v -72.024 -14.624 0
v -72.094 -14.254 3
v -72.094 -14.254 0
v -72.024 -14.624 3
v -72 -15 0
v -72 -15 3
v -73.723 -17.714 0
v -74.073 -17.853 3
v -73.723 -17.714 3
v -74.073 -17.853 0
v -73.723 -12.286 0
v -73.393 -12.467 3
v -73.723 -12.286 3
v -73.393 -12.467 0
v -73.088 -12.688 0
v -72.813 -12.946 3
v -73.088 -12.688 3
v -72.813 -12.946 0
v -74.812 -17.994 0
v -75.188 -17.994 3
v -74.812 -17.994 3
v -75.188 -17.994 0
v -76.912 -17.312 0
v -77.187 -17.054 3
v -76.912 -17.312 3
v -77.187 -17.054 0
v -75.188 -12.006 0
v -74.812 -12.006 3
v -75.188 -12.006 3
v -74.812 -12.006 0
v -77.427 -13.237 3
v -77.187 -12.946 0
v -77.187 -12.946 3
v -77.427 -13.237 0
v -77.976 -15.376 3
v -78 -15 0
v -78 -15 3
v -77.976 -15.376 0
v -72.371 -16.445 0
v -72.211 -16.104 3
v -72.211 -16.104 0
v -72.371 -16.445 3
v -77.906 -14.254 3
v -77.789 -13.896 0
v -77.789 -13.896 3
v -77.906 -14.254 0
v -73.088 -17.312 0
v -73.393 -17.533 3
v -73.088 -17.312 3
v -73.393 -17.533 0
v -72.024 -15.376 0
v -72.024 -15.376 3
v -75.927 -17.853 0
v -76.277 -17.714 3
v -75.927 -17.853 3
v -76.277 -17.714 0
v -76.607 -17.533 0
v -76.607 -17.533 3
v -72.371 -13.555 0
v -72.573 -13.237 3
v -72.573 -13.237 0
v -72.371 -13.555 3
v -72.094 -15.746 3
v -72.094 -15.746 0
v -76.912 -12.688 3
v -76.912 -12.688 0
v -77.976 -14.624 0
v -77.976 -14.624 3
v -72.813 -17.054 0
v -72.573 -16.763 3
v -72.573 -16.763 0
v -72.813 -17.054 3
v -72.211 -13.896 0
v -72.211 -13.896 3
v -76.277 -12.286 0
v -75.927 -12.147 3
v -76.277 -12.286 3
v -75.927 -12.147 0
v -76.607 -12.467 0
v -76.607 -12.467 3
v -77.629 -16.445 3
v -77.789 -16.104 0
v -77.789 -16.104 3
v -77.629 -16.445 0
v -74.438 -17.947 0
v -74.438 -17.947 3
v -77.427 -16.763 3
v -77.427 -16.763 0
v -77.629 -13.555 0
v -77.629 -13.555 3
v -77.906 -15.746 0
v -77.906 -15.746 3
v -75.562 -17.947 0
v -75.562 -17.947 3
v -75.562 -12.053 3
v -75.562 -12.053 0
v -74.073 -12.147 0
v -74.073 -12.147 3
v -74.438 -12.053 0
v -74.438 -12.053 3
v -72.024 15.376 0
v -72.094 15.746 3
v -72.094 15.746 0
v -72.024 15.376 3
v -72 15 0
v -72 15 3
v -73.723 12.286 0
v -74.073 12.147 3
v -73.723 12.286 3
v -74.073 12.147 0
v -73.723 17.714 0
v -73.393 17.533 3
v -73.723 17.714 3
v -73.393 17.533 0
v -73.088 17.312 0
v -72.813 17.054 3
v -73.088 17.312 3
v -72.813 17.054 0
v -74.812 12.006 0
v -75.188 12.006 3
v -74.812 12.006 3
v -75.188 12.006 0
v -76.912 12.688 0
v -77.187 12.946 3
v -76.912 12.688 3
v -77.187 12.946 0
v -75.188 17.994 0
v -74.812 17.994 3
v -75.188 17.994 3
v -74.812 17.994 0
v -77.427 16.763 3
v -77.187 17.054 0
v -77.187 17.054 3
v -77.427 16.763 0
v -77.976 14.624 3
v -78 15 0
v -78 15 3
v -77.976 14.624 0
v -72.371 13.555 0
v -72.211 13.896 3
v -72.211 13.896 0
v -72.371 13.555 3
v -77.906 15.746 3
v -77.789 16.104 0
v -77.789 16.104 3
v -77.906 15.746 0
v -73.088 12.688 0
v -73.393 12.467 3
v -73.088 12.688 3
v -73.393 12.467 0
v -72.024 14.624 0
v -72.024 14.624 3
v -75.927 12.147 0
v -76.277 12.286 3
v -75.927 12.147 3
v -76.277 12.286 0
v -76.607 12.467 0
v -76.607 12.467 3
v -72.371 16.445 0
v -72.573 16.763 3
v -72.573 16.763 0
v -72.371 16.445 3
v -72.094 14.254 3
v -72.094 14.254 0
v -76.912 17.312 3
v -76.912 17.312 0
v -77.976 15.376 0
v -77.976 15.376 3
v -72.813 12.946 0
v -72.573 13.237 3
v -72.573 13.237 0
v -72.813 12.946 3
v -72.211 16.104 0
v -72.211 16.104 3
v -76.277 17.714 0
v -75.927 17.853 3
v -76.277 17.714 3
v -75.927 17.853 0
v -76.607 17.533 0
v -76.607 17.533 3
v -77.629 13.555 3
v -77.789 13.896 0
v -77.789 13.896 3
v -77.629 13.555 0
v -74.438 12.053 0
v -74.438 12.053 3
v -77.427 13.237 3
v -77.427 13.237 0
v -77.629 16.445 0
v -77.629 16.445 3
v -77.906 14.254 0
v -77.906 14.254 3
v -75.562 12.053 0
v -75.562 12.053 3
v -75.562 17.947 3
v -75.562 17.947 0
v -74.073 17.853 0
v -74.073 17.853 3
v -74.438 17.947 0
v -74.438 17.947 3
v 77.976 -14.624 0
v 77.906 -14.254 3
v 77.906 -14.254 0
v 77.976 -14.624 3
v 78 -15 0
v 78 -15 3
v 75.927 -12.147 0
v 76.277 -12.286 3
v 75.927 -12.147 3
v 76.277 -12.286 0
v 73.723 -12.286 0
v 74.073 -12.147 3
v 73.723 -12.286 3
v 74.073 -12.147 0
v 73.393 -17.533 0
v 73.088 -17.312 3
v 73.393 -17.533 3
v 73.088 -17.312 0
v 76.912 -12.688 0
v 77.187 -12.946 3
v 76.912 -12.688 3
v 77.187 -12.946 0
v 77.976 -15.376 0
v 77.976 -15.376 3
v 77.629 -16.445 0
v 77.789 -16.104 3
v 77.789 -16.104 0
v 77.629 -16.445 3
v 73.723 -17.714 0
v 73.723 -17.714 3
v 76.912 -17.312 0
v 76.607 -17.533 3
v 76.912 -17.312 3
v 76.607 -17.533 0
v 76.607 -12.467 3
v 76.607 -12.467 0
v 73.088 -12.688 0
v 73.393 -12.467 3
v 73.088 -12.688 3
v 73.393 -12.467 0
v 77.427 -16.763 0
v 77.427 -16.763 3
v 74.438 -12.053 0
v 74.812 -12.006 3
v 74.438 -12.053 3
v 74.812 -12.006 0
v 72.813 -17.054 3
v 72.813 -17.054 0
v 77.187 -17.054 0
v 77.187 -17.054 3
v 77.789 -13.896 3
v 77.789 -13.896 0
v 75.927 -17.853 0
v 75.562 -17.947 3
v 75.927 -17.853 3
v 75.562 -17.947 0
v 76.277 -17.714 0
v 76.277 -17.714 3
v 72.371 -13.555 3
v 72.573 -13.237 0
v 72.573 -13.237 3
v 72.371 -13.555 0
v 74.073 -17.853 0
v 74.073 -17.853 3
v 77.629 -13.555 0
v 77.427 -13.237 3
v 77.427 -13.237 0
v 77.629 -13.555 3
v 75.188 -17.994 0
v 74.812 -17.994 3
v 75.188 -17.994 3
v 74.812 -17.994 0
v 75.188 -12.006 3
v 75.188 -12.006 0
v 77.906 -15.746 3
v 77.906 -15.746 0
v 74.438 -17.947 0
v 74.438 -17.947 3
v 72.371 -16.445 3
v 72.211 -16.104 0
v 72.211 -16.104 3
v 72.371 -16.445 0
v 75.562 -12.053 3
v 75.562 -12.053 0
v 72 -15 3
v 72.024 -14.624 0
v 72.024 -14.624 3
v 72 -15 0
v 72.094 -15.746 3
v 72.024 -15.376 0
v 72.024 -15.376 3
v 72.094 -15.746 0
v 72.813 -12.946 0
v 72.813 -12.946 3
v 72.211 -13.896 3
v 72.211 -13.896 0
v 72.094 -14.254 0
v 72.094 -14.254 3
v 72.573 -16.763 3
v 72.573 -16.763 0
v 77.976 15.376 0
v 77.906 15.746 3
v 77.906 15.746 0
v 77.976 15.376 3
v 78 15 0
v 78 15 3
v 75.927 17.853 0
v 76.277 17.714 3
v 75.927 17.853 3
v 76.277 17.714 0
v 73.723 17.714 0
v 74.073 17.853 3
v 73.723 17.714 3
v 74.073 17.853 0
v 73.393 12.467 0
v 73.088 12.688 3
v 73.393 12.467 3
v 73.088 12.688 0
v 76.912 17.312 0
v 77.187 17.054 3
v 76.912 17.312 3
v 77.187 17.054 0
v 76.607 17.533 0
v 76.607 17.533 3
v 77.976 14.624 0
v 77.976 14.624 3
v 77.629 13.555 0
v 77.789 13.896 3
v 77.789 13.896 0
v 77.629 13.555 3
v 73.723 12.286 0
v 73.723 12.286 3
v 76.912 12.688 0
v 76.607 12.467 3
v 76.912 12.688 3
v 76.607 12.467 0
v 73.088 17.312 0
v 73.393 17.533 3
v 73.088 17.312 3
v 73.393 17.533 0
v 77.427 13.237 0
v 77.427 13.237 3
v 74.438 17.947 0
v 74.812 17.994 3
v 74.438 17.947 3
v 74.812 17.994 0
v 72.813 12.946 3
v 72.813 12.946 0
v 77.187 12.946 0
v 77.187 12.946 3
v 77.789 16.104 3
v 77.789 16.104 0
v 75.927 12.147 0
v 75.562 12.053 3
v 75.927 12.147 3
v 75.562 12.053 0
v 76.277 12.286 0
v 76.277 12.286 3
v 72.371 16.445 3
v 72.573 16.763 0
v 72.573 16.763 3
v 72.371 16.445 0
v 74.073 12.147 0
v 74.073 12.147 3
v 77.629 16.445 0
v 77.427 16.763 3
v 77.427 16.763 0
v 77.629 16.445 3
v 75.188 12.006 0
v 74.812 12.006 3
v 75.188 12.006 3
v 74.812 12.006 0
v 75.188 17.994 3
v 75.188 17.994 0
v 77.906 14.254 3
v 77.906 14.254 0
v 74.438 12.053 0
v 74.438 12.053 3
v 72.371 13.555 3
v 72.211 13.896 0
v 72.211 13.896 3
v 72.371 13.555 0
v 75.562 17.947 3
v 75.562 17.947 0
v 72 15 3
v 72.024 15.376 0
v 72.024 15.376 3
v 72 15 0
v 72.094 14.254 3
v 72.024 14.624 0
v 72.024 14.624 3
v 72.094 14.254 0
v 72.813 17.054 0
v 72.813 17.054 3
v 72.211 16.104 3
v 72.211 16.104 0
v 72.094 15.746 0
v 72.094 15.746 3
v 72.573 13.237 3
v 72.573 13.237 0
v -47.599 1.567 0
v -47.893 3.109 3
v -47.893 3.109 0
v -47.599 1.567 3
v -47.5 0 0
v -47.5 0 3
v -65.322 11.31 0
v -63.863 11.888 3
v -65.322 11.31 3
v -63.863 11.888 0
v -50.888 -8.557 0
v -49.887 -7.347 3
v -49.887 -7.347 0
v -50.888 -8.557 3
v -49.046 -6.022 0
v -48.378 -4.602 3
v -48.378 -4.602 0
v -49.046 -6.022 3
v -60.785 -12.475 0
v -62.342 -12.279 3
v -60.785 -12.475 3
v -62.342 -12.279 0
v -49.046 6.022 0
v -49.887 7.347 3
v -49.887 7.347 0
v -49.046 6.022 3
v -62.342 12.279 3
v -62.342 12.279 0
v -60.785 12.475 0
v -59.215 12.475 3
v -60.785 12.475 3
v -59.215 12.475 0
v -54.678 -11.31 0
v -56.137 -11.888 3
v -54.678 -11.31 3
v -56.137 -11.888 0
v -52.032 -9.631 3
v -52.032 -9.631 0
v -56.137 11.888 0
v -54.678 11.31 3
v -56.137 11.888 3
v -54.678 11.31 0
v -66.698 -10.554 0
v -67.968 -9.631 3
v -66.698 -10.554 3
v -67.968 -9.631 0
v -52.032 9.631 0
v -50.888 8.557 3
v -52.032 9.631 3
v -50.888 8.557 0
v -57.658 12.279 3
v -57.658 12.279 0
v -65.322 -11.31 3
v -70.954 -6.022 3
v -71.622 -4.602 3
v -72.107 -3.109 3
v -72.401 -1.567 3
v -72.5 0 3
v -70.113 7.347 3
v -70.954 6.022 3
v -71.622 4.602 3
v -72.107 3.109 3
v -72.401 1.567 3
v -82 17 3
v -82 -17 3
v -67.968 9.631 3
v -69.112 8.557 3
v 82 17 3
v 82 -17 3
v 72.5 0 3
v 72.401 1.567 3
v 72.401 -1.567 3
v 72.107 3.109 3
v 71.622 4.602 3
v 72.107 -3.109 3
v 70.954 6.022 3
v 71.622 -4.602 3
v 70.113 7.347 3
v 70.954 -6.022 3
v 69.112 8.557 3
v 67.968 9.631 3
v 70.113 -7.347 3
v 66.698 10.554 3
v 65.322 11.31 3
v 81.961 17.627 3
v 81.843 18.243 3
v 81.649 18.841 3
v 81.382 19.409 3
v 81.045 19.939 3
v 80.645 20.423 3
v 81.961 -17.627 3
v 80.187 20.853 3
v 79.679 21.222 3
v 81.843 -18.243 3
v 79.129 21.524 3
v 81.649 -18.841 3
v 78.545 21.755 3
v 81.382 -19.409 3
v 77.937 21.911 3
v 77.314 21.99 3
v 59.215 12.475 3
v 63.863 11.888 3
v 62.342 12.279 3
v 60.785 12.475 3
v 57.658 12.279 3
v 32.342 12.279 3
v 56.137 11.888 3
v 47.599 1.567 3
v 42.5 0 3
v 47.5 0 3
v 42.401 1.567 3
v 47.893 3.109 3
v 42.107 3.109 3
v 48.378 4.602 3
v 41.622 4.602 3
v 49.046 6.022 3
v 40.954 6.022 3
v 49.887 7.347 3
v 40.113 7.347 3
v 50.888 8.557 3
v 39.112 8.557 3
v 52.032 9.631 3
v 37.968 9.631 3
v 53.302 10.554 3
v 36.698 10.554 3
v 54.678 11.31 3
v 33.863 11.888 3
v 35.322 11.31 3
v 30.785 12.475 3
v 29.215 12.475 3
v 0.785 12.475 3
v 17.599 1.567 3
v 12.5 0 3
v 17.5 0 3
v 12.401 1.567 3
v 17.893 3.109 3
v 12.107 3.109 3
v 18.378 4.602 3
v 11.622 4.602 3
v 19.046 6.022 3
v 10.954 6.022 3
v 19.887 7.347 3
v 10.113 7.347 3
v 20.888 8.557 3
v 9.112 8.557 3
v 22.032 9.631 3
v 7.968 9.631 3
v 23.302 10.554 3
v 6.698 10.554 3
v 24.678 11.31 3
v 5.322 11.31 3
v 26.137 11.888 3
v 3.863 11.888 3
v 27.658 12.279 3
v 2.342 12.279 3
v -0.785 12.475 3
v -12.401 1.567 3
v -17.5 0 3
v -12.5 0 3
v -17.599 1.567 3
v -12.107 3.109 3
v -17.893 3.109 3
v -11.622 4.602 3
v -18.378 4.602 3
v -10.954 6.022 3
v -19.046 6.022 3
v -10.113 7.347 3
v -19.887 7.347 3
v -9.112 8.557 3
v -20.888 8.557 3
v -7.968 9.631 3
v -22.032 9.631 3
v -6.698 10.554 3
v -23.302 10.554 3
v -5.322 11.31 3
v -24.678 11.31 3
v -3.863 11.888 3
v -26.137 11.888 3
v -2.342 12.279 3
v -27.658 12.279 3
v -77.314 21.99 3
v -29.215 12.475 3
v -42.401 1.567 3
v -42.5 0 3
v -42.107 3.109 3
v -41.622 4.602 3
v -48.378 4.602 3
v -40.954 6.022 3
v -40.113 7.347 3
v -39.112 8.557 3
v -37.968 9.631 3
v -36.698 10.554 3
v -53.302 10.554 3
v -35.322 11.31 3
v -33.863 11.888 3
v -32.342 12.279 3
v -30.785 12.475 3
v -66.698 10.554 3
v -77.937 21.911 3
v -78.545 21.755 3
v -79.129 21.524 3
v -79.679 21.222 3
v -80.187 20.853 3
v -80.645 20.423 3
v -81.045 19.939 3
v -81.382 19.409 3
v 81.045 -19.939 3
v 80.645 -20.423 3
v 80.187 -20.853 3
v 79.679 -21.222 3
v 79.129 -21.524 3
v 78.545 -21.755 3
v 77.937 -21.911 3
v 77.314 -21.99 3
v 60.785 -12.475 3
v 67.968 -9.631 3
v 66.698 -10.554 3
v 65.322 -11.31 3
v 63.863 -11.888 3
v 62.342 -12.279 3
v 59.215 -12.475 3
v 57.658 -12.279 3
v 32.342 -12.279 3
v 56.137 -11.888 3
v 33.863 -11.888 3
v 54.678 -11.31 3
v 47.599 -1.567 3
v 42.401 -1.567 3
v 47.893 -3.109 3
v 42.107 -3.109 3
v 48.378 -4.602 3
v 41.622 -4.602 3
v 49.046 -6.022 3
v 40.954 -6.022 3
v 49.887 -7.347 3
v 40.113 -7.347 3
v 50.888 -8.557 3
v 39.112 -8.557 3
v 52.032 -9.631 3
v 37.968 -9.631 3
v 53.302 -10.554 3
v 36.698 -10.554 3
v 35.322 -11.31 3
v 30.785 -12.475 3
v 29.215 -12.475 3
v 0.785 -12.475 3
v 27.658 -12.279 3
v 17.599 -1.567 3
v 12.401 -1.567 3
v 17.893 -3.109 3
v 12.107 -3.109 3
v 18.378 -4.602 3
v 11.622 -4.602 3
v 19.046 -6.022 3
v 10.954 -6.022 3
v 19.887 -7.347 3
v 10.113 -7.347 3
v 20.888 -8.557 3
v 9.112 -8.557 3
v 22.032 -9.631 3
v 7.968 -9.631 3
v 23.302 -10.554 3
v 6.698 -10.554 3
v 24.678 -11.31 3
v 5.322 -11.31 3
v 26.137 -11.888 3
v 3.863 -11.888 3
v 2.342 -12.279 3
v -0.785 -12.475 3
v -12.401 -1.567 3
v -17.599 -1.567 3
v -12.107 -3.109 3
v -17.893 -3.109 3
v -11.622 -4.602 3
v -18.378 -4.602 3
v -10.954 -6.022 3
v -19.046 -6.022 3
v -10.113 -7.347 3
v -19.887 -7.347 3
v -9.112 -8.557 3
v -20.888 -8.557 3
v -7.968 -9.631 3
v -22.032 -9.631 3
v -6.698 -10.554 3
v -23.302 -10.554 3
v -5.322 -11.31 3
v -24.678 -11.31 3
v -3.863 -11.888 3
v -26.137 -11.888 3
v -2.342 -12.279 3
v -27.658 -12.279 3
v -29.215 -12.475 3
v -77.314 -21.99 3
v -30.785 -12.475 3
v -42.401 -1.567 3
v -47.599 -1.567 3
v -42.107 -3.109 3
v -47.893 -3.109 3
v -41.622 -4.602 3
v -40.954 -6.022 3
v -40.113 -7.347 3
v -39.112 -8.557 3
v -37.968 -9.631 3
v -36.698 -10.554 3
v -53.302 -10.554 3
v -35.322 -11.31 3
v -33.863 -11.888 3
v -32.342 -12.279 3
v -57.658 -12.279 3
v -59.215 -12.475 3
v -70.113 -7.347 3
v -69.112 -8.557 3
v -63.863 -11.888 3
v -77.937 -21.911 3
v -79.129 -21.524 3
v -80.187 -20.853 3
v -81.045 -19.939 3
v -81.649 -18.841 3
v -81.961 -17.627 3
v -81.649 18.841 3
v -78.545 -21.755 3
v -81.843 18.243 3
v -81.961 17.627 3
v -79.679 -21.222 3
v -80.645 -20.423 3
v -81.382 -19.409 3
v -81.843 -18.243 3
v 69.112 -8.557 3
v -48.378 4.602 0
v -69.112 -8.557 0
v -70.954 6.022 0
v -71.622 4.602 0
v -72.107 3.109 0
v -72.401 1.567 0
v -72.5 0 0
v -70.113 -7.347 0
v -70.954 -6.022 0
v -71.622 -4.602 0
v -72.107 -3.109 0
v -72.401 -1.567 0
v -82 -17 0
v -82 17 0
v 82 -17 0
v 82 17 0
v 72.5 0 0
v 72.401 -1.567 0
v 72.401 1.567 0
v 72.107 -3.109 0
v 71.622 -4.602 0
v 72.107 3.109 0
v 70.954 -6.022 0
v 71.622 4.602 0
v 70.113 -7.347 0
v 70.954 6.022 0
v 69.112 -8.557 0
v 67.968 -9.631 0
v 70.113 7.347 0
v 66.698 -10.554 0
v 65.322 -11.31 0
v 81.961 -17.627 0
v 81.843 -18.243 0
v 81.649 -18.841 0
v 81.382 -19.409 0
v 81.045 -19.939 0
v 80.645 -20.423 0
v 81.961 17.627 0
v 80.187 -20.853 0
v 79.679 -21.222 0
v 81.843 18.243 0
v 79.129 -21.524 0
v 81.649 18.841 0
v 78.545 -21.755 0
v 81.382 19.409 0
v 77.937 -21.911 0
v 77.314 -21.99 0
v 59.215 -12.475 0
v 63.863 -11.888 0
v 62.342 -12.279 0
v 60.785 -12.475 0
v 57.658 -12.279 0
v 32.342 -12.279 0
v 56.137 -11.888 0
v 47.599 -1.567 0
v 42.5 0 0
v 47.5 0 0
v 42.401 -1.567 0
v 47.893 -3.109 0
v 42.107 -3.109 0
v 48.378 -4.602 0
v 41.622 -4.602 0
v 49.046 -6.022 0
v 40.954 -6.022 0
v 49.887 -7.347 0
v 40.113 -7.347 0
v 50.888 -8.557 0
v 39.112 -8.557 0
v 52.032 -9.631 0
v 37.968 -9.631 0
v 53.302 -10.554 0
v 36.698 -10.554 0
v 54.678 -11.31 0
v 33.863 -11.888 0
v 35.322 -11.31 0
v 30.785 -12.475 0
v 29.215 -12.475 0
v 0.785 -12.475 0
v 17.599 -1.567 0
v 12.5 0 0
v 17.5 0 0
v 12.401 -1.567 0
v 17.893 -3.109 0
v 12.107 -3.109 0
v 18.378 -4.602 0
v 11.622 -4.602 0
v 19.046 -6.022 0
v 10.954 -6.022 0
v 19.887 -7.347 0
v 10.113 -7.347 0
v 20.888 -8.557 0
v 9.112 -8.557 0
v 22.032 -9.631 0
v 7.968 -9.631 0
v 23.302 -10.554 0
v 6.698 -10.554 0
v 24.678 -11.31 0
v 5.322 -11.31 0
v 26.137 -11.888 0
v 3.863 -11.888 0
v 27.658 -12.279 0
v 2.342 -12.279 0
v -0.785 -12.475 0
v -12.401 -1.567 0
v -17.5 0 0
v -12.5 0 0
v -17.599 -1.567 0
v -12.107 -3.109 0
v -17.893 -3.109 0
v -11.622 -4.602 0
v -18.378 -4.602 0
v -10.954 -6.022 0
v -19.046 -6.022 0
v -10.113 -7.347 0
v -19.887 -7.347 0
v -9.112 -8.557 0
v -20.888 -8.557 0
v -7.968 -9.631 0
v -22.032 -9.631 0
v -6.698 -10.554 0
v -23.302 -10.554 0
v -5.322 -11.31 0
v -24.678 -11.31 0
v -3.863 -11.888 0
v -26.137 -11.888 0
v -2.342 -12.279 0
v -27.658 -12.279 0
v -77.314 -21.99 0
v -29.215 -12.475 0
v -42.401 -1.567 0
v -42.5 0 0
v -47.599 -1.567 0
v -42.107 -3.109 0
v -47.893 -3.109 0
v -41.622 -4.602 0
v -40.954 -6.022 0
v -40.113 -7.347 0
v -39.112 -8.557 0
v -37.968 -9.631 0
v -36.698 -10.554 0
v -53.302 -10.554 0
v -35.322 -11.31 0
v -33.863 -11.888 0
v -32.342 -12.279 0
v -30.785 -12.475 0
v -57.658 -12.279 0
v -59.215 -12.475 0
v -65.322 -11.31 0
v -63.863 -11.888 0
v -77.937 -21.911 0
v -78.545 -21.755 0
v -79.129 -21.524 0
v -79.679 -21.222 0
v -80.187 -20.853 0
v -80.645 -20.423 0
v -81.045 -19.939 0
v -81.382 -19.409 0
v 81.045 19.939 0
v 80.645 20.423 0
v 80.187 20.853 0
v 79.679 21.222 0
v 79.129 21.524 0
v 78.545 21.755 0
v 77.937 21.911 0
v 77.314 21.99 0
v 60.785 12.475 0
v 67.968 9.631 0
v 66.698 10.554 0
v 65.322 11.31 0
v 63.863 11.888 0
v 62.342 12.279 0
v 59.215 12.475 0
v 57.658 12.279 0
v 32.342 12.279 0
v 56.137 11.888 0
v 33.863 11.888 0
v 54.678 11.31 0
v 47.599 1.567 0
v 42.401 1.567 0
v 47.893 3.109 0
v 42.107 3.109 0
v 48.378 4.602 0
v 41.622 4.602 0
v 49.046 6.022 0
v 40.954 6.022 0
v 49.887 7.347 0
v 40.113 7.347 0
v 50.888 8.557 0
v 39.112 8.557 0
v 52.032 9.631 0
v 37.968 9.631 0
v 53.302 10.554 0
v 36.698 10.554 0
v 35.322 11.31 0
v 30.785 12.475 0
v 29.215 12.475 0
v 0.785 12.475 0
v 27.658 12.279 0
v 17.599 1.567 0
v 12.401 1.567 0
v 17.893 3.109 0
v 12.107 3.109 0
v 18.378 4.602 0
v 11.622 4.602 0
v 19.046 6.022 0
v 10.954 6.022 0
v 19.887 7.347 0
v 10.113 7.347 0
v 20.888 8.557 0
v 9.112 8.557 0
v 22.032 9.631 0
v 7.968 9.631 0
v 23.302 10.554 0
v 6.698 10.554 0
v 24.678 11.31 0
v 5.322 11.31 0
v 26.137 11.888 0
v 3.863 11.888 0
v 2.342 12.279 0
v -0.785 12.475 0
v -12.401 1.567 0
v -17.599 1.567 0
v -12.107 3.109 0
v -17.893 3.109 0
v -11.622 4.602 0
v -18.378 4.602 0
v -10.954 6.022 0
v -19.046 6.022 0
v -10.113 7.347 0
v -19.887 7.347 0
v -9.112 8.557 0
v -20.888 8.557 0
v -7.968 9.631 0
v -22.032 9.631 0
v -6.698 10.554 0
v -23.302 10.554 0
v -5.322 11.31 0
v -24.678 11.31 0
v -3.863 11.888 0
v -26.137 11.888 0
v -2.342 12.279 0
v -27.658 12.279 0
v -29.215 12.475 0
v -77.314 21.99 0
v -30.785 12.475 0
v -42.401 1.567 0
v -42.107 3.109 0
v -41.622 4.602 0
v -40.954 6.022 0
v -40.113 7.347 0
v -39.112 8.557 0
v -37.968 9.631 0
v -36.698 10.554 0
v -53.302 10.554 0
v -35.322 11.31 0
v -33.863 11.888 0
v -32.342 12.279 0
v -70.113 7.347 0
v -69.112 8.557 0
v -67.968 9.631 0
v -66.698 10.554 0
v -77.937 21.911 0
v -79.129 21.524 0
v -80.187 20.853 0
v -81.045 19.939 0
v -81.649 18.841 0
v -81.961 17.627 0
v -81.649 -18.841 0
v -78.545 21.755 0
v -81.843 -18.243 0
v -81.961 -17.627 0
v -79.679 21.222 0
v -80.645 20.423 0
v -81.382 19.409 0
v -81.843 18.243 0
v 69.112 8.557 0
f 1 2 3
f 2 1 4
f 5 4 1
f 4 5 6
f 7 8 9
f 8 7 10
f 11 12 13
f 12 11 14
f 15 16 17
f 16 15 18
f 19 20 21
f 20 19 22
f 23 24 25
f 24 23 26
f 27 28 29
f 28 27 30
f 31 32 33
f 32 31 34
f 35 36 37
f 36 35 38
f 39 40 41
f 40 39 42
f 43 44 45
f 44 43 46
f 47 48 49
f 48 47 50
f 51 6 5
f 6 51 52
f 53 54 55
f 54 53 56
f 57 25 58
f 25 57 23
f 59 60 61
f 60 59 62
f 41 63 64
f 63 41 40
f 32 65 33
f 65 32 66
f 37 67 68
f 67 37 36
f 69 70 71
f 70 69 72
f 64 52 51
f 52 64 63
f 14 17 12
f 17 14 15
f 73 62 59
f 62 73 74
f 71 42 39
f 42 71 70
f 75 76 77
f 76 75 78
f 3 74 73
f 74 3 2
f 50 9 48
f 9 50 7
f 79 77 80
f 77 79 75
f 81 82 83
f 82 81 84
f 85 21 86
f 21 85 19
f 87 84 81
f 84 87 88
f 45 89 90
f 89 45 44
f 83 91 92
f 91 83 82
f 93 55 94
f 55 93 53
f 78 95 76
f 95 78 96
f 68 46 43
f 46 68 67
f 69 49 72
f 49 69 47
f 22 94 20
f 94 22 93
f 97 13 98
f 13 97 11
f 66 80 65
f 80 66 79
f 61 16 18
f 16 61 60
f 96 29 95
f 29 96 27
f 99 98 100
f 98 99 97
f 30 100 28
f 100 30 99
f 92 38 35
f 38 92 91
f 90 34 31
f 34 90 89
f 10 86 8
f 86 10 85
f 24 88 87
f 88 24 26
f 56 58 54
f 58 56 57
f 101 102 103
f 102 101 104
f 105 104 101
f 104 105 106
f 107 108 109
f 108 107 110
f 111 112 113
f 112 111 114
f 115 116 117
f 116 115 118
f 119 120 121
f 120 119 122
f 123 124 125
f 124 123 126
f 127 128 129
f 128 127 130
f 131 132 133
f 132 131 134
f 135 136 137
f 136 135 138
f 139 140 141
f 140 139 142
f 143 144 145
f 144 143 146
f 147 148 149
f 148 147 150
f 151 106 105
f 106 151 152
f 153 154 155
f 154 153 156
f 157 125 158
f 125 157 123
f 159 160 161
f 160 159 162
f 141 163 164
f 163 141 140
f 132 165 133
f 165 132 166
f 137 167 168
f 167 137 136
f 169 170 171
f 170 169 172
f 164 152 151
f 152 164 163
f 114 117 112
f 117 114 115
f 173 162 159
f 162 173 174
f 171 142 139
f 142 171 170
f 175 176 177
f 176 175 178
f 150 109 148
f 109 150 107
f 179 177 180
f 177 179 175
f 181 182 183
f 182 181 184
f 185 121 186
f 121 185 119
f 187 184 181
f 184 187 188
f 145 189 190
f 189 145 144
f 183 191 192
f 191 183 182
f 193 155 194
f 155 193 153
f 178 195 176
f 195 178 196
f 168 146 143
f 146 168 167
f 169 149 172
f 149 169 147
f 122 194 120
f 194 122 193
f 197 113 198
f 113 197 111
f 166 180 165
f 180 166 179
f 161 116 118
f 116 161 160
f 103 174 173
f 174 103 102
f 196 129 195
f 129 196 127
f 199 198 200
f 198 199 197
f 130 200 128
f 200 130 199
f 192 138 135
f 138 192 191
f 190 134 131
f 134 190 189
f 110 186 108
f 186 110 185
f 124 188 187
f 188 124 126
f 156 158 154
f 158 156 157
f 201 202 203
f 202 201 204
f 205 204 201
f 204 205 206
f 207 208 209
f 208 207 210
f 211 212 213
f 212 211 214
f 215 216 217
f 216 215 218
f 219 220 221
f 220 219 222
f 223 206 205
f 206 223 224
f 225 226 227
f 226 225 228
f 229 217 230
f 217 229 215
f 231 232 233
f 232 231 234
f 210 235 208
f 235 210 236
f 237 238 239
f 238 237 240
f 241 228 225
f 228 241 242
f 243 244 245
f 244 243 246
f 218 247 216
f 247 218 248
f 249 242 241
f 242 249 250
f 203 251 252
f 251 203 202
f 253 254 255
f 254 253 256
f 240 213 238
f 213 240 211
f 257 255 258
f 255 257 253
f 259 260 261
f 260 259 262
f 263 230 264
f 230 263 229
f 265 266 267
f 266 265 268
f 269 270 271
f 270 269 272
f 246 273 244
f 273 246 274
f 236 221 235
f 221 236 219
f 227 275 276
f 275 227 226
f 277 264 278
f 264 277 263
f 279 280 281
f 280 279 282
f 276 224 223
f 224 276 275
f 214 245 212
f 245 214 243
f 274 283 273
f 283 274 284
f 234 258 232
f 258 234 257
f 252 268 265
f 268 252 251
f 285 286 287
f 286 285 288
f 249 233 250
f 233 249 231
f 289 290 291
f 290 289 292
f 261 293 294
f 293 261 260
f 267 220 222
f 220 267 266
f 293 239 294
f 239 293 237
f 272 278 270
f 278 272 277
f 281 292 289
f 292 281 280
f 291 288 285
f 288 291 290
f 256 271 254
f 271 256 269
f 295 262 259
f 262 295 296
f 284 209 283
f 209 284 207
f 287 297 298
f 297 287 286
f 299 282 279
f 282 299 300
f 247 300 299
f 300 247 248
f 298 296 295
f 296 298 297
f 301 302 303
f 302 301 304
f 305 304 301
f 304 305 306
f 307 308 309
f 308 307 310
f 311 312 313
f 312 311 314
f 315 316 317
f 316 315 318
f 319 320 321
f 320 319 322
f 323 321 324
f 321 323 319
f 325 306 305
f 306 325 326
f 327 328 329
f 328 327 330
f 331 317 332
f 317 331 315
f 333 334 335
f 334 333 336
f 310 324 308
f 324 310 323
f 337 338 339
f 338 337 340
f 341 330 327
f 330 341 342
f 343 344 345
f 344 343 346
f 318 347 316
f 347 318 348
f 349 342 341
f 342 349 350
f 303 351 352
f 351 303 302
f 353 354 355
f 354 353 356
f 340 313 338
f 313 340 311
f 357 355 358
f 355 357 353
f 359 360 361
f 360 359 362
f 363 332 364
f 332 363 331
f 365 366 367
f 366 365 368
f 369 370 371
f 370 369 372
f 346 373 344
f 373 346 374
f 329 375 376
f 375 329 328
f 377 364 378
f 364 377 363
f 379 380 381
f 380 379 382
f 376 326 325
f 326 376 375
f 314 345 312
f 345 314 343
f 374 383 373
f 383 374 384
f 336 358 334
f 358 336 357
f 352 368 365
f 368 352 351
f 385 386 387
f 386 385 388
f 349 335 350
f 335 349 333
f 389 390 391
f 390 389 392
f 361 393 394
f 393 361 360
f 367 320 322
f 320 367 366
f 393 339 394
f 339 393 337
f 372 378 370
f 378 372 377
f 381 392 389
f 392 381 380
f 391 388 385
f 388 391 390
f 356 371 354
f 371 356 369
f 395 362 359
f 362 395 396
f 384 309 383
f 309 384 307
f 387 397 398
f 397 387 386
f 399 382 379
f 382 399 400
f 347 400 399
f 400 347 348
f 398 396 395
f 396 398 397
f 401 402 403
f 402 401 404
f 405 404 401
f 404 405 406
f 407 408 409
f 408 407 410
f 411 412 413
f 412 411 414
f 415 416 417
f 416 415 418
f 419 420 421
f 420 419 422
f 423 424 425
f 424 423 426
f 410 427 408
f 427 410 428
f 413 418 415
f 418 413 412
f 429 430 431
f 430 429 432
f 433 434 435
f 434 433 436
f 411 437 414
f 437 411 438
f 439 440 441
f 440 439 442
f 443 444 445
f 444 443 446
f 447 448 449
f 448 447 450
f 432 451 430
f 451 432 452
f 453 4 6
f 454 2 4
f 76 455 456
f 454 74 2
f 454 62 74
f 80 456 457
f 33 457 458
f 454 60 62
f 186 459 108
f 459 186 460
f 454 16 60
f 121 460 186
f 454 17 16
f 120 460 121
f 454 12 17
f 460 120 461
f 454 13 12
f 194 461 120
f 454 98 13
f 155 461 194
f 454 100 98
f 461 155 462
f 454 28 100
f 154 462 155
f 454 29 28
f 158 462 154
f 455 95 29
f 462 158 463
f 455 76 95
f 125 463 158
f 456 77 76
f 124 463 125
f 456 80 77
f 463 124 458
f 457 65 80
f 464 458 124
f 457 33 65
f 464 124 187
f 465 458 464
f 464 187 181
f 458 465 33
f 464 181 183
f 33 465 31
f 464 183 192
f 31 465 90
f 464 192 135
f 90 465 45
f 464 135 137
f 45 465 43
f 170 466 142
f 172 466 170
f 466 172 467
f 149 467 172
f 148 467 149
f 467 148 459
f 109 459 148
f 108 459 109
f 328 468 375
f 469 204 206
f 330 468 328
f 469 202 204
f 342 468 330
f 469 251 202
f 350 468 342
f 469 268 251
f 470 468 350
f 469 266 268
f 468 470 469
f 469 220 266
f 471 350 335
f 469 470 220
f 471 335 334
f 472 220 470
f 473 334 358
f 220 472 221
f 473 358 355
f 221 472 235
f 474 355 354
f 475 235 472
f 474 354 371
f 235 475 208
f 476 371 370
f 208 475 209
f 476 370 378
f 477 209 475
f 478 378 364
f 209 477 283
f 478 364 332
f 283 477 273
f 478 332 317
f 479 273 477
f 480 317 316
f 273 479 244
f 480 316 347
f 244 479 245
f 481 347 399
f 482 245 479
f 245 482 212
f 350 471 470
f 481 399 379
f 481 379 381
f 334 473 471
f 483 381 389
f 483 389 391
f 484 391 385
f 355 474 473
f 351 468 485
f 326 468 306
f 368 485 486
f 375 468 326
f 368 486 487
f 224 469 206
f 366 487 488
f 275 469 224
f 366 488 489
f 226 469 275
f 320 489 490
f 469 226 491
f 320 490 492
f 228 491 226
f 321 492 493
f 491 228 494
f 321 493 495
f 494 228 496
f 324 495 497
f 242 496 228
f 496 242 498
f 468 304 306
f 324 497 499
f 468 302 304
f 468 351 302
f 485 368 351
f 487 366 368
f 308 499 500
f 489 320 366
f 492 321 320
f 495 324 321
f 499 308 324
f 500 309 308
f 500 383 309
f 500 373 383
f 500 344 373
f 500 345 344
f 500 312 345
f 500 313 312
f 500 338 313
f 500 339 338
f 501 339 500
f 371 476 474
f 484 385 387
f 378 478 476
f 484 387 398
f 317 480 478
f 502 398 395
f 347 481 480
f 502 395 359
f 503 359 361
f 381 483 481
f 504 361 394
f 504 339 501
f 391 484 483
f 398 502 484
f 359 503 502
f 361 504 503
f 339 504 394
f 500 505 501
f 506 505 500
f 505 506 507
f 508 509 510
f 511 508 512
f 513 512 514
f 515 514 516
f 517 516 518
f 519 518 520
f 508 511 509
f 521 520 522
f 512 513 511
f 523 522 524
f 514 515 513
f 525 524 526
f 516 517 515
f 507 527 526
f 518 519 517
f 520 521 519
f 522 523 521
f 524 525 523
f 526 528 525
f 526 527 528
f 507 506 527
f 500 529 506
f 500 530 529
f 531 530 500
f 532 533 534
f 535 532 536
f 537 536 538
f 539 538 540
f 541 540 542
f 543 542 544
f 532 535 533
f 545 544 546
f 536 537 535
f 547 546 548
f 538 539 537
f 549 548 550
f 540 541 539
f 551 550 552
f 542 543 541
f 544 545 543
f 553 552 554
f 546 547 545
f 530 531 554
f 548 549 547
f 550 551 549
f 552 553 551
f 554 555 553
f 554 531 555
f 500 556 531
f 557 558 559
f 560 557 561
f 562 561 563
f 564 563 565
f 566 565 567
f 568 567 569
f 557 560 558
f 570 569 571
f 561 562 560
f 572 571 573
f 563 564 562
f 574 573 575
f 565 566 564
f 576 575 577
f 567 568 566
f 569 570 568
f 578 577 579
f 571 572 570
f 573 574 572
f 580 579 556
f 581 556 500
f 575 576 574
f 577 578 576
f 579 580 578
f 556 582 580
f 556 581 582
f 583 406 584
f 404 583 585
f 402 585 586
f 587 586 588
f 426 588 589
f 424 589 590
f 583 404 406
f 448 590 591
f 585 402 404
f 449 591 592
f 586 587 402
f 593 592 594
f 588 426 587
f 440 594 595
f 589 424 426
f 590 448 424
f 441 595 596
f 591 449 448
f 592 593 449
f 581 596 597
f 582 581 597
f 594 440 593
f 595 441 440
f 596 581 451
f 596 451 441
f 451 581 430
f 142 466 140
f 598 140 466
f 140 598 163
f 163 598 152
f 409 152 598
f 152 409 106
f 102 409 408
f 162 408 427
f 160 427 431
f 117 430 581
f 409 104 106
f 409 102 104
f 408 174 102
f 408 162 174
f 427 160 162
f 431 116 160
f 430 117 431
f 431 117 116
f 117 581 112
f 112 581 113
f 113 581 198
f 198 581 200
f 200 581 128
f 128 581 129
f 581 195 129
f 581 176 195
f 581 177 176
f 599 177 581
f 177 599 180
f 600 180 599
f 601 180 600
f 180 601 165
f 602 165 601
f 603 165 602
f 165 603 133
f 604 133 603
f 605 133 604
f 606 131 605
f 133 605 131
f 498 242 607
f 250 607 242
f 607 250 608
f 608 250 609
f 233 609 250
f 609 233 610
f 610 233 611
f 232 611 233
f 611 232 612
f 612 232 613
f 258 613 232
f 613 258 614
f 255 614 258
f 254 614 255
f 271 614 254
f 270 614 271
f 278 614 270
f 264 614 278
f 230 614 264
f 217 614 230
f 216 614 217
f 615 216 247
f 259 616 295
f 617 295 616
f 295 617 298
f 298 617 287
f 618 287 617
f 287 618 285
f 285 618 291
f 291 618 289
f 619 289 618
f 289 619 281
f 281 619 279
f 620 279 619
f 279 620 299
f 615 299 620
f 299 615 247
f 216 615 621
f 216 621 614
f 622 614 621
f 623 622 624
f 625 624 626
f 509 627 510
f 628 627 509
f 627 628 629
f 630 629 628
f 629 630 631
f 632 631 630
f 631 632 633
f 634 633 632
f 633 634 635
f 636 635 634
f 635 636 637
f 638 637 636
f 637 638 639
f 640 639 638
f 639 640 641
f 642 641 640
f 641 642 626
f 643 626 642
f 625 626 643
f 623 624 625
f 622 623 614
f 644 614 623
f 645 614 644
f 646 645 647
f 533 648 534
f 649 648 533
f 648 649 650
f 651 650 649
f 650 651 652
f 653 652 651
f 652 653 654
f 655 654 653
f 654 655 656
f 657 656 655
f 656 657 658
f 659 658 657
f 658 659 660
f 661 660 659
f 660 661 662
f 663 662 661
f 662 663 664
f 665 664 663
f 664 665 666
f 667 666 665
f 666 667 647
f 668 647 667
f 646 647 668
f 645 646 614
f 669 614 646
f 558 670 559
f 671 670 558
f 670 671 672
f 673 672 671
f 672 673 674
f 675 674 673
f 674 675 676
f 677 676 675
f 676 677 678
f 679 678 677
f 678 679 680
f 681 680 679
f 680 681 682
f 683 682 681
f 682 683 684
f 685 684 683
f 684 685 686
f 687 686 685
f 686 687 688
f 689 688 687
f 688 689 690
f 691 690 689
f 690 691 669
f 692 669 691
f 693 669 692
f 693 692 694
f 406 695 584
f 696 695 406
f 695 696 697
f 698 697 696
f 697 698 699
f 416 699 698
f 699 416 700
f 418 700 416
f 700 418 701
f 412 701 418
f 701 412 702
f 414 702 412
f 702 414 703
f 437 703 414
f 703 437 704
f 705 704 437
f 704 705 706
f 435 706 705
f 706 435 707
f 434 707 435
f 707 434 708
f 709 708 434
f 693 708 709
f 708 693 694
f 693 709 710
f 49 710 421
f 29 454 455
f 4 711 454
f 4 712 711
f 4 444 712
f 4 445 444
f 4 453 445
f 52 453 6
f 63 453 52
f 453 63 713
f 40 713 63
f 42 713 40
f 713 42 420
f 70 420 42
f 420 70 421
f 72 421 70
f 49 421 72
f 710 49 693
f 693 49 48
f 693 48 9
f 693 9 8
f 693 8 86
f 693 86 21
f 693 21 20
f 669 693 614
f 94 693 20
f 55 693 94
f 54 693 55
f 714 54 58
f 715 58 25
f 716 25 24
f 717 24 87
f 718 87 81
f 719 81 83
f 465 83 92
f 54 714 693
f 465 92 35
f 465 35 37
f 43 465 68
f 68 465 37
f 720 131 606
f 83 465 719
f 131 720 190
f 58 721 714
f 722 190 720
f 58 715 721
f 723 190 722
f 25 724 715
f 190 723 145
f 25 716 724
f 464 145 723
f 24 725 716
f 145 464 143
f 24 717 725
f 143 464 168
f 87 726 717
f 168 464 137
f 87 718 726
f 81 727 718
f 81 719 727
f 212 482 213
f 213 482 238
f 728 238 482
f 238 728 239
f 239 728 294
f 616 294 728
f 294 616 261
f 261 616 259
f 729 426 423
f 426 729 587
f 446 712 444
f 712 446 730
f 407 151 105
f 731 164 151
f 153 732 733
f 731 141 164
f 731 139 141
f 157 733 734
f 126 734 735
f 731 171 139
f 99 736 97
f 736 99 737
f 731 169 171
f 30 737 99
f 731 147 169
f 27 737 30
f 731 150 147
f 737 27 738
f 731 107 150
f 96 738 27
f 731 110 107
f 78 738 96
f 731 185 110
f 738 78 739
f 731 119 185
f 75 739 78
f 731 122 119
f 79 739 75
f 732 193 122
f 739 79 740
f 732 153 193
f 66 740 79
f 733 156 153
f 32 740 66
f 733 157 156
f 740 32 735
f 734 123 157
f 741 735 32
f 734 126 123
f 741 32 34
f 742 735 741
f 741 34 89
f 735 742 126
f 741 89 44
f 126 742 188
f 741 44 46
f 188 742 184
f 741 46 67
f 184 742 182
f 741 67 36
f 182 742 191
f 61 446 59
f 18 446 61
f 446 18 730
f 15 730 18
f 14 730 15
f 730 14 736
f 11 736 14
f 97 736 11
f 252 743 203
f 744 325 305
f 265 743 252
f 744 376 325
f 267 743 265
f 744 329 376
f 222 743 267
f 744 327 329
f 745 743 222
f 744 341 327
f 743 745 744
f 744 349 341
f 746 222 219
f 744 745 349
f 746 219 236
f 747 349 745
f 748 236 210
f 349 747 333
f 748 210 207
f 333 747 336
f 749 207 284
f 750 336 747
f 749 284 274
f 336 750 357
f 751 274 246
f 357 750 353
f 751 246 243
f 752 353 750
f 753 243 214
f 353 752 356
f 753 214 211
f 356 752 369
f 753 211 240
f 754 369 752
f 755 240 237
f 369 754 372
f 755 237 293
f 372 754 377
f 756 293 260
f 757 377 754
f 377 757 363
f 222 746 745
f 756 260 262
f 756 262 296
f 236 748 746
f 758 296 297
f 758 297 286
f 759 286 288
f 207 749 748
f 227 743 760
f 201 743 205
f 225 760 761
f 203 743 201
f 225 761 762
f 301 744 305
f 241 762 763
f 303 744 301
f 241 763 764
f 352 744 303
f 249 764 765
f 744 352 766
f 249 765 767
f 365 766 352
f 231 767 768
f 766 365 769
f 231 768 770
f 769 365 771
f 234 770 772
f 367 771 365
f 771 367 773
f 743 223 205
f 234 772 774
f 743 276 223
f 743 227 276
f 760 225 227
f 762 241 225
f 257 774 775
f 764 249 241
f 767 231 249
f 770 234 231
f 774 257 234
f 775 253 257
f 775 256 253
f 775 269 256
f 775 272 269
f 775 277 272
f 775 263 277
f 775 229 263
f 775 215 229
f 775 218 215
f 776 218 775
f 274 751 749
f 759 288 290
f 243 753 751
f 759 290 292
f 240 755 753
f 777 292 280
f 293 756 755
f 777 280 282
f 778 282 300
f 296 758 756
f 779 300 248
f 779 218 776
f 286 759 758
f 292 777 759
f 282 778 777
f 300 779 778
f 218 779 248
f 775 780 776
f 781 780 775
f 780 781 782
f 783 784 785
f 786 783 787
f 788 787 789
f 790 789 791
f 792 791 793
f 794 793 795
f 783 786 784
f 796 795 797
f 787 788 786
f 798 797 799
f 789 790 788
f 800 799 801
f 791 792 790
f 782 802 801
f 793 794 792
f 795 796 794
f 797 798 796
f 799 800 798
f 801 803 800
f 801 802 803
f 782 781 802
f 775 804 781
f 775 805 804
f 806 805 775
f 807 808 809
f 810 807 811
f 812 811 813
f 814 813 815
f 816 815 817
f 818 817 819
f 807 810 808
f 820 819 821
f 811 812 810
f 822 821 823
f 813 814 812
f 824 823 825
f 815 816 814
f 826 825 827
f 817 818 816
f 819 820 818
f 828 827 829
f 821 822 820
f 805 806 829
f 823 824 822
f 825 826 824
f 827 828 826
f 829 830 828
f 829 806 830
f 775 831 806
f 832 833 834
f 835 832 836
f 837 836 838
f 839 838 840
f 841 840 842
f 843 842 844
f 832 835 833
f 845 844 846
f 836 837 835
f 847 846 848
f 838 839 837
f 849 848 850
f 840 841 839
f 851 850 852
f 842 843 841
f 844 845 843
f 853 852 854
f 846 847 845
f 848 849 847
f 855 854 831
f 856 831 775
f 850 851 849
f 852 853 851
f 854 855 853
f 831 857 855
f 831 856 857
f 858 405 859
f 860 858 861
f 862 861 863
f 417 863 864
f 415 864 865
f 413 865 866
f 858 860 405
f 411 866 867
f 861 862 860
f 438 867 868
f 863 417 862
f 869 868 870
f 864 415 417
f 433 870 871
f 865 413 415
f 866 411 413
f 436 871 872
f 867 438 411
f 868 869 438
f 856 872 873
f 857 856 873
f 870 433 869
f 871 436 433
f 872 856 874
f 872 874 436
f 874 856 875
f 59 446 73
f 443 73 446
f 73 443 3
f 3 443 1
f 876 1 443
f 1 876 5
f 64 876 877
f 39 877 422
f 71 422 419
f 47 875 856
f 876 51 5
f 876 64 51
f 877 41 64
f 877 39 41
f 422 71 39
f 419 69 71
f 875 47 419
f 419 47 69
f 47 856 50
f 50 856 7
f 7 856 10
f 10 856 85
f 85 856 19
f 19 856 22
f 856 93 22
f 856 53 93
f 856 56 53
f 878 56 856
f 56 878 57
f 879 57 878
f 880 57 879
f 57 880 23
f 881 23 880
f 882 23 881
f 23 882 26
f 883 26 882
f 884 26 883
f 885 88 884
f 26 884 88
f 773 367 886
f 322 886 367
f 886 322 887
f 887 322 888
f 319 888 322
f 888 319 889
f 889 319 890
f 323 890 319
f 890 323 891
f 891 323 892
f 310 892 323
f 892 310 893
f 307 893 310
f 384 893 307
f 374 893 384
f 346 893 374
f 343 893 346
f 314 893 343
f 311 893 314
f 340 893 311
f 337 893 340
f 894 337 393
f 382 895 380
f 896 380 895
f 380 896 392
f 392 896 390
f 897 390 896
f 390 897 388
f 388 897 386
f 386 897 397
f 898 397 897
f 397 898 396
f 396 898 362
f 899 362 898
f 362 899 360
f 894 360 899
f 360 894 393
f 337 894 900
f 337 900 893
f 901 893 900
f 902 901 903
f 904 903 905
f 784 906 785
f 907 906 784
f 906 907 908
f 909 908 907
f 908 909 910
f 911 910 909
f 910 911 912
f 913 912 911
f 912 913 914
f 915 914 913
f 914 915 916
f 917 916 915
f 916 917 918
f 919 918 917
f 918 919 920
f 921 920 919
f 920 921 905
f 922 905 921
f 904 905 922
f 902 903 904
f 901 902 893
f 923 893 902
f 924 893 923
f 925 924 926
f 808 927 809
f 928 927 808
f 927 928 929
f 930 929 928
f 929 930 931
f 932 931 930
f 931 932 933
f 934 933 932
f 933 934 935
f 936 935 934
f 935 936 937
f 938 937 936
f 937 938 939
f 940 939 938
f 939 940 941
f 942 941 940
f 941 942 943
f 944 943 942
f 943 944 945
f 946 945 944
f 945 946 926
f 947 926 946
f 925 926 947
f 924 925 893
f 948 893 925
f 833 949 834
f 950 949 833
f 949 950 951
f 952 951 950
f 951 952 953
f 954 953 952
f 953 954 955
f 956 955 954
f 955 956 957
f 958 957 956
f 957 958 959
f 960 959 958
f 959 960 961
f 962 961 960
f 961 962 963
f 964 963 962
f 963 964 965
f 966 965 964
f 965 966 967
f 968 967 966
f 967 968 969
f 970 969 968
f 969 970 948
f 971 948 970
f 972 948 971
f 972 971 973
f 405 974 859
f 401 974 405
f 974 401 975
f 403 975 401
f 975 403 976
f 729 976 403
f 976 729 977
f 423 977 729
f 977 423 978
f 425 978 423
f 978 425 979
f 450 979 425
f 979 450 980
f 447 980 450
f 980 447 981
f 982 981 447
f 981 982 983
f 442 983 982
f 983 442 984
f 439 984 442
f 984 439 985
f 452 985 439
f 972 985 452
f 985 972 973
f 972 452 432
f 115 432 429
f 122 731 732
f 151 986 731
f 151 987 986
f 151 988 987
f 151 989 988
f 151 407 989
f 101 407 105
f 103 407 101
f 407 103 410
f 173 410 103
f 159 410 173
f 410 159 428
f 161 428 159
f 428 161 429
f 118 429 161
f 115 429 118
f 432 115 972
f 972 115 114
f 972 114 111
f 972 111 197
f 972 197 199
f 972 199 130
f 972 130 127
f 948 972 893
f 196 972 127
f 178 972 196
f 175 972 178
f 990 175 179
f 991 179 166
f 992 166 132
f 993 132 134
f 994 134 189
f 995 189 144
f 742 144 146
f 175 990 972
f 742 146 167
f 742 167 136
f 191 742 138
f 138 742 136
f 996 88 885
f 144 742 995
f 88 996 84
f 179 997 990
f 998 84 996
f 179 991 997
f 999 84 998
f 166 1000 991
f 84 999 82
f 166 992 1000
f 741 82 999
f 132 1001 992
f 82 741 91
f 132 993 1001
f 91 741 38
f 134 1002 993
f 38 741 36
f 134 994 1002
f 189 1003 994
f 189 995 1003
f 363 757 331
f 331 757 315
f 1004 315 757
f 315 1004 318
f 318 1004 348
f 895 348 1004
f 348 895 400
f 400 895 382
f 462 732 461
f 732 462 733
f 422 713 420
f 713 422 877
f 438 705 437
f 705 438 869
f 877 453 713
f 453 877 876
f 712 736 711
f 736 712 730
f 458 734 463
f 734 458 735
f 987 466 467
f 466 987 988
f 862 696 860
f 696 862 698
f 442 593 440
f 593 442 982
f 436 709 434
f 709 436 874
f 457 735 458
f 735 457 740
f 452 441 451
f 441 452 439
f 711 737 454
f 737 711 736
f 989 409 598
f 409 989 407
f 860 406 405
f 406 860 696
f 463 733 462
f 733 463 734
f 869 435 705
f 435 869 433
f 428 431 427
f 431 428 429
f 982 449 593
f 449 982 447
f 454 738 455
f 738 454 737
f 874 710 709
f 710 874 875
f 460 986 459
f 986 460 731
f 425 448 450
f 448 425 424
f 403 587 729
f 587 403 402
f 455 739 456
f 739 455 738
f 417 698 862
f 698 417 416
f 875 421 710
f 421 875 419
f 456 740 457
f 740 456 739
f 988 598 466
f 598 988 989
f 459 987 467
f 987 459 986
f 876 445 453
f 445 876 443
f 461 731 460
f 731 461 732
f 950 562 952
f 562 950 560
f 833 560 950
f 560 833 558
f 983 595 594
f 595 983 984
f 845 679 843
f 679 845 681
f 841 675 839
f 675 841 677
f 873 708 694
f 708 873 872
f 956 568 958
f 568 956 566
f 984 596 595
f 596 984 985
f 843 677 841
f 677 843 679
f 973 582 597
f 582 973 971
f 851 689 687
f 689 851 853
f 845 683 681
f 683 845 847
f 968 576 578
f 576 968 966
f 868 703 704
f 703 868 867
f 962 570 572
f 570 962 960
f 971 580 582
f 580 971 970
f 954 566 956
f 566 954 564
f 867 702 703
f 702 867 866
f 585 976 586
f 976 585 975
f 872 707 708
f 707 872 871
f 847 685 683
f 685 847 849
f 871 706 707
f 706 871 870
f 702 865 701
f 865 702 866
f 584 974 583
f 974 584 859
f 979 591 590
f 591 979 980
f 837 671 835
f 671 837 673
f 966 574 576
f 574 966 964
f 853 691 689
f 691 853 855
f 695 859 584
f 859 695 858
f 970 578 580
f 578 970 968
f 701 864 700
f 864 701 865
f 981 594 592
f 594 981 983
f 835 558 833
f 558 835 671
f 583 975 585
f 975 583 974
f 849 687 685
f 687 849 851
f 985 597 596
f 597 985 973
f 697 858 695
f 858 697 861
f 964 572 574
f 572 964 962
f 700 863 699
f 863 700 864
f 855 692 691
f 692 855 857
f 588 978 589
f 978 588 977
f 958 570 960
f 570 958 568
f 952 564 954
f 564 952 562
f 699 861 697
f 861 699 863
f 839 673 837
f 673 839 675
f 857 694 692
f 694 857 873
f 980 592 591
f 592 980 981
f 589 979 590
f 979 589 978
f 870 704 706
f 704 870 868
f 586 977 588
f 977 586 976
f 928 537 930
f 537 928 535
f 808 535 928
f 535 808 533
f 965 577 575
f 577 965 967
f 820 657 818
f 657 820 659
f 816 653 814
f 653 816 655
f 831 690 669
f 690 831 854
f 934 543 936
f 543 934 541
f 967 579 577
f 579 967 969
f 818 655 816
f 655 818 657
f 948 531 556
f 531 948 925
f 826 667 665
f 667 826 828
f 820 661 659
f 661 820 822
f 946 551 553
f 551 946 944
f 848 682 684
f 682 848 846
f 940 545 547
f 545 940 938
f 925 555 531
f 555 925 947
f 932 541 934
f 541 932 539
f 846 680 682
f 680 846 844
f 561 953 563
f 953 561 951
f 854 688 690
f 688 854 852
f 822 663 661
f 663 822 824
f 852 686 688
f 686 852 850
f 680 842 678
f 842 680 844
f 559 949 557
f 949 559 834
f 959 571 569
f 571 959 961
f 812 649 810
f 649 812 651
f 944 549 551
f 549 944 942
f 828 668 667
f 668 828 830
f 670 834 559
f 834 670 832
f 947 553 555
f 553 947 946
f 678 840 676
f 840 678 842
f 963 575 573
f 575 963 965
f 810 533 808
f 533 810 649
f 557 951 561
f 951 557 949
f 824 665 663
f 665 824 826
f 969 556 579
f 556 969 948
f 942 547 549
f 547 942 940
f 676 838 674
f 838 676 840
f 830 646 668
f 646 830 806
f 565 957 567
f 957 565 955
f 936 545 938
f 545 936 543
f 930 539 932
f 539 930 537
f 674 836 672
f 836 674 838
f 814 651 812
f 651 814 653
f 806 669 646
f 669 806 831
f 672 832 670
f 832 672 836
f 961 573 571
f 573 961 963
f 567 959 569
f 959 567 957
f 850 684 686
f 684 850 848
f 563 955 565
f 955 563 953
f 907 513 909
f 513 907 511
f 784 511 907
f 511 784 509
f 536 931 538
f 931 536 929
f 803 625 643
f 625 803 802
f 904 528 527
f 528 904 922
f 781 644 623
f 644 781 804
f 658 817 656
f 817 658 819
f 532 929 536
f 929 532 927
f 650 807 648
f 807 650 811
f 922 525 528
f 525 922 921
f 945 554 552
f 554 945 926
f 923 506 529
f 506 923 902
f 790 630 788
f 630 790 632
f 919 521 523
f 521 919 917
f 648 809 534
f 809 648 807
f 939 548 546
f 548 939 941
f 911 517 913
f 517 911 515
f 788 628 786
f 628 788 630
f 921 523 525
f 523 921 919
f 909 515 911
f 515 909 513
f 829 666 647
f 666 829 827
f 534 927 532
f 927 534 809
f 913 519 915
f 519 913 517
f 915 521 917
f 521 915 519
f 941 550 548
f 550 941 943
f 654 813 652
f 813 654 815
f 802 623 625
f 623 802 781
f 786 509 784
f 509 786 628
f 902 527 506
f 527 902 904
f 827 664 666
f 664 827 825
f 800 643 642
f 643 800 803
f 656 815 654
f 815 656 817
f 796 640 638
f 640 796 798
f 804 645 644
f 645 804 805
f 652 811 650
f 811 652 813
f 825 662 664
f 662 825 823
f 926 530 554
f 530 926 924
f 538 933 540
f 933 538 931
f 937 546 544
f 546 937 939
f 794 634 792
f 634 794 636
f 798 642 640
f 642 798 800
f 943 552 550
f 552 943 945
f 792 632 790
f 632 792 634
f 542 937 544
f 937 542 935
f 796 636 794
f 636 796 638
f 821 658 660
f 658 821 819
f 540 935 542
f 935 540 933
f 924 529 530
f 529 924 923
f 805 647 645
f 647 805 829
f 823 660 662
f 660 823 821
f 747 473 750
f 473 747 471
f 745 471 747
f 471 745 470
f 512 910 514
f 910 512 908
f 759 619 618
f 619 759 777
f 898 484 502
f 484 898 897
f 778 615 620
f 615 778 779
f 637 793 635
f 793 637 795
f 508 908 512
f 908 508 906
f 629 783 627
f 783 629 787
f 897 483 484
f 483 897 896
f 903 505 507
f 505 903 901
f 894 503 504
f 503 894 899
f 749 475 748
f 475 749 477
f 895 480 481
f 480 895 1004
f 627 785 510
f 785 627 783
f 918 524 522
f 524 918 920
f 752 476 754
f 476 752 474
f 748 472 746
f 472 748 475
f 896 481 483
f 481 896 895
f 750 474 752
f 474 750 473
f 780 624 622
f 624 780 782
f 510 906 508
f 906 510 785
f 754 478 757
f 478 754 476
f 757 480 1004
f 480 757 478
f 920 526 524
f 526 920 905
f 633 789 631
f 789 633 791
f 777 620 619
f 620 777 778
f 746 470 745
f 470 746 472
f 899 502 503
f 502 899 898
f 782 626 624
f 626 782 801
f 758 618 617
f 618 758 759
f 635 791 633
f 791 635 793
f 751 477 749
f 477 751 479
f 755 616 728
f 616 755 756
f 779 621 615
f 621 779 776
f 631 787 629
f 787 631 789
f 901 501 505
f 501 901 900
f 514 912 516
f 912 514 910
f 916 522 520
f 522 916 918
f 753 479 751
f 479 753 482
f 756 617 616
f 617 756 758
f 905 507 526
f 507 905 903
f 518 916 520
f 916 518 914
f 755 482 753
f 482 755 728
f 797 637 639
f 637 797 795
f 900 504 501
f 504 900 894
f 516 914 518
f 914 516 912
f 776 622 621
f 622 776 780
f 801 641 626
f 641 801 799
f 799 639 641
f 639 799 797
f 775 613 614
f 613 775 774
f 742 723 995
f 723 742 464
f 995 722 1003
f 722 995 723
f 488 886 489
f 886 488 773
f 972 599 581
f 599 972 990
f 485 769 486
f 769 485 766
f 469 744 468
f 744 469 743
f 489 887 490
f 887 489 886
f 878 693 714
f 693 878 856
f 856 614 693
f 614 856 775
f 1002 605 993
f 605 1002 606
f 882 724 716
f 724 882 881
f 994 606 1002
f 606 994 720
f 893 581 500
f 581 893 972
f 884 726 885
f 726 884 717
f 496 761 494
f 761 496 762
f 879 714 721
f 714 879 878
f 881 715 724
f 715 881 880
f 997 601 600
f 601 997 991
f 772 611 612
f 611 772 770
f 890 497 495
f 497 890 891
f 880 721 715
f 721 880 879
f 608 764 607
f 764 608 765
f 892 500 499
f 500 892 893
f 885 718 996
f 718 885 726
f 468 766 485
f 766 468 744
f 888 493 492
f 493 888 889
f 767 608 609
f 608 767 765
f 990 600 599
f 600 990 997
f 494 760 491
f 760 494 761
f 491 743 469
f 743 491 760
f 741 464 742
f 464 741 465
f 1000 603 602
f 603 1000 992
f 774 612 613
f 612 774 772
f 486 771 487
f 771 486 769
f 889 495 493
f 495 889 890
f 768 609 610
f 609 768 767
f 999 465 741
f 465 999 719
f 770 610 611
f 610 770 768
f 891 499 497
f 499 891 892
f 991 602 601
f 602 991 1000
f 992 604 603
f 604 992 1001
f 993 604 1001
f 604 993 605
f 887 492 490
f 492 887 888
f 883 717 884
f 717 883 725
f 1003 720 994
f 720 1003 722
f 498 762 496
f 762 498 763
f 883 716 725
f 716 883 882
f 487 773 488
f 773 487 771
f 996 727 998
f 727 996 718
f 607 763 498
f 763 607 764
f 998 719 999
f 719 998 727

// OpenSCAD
$fn = 50;


difference() {
	union() {
		hull() {
			translate(v = [-77.0000000000, 17.0000000000, 0]) {
				cylinder(h = 3, r = 5);
			}
			translate(v = [77.0000000000, 17.0000000000, 0]) {
				cylinder(h = 3, r = 5);
			}
			translate(v = [-77.0000000000, -17.0000000000, 0]) {
				cylinder(h = 3, r = 5);
			}
			translate(v = [77.0000000000, -17.0000000000, 0]) {
				cylinder(h = 3, r = 5);
			}
		}
	}
	union() {
		#translate(v = [-75.0000000000, -15.0000000000, -100.0000000000]) {
			cylinder(h = 200, r = 3.0000000000);
		}
		#translate(v = [-75.0000000000, 15.0000000000, -100.0000000000]) {
			cylinder(h = 200, r = 3.0000000000);
		}
		#translate(v = [75.0000000000, -15.0000000000, -100.0000000000]) {
			cylinder(h = 200, r = 3.0000000000);
		}
		#translate(v = [75.0000000000, 15.0000000000, -100.0000000000]) {
			cylinder(h = 200, r = 3.0000000000);
		}
		#translate(v = [-60.0000000000, 0, 0]) {
			cylinder(h = 3, r = 12.5000000000);
		}
		#translate(v = [-30.0000000000, 0, 0]) {
			cylinder(h = 3, r = 12.5000000000);
		}
		#cylinder(h = 3, r = 12.5000000000);
		#translate(v = [30.0000000000, 0, 0]) {
			cylinder(h = 3, r = 12.5000000000);
		}
		#translate(v = [60.0000000000, 0, 0]) {
			cylinder(h = 3, r = 12.5000000000);
		}
	}
}
